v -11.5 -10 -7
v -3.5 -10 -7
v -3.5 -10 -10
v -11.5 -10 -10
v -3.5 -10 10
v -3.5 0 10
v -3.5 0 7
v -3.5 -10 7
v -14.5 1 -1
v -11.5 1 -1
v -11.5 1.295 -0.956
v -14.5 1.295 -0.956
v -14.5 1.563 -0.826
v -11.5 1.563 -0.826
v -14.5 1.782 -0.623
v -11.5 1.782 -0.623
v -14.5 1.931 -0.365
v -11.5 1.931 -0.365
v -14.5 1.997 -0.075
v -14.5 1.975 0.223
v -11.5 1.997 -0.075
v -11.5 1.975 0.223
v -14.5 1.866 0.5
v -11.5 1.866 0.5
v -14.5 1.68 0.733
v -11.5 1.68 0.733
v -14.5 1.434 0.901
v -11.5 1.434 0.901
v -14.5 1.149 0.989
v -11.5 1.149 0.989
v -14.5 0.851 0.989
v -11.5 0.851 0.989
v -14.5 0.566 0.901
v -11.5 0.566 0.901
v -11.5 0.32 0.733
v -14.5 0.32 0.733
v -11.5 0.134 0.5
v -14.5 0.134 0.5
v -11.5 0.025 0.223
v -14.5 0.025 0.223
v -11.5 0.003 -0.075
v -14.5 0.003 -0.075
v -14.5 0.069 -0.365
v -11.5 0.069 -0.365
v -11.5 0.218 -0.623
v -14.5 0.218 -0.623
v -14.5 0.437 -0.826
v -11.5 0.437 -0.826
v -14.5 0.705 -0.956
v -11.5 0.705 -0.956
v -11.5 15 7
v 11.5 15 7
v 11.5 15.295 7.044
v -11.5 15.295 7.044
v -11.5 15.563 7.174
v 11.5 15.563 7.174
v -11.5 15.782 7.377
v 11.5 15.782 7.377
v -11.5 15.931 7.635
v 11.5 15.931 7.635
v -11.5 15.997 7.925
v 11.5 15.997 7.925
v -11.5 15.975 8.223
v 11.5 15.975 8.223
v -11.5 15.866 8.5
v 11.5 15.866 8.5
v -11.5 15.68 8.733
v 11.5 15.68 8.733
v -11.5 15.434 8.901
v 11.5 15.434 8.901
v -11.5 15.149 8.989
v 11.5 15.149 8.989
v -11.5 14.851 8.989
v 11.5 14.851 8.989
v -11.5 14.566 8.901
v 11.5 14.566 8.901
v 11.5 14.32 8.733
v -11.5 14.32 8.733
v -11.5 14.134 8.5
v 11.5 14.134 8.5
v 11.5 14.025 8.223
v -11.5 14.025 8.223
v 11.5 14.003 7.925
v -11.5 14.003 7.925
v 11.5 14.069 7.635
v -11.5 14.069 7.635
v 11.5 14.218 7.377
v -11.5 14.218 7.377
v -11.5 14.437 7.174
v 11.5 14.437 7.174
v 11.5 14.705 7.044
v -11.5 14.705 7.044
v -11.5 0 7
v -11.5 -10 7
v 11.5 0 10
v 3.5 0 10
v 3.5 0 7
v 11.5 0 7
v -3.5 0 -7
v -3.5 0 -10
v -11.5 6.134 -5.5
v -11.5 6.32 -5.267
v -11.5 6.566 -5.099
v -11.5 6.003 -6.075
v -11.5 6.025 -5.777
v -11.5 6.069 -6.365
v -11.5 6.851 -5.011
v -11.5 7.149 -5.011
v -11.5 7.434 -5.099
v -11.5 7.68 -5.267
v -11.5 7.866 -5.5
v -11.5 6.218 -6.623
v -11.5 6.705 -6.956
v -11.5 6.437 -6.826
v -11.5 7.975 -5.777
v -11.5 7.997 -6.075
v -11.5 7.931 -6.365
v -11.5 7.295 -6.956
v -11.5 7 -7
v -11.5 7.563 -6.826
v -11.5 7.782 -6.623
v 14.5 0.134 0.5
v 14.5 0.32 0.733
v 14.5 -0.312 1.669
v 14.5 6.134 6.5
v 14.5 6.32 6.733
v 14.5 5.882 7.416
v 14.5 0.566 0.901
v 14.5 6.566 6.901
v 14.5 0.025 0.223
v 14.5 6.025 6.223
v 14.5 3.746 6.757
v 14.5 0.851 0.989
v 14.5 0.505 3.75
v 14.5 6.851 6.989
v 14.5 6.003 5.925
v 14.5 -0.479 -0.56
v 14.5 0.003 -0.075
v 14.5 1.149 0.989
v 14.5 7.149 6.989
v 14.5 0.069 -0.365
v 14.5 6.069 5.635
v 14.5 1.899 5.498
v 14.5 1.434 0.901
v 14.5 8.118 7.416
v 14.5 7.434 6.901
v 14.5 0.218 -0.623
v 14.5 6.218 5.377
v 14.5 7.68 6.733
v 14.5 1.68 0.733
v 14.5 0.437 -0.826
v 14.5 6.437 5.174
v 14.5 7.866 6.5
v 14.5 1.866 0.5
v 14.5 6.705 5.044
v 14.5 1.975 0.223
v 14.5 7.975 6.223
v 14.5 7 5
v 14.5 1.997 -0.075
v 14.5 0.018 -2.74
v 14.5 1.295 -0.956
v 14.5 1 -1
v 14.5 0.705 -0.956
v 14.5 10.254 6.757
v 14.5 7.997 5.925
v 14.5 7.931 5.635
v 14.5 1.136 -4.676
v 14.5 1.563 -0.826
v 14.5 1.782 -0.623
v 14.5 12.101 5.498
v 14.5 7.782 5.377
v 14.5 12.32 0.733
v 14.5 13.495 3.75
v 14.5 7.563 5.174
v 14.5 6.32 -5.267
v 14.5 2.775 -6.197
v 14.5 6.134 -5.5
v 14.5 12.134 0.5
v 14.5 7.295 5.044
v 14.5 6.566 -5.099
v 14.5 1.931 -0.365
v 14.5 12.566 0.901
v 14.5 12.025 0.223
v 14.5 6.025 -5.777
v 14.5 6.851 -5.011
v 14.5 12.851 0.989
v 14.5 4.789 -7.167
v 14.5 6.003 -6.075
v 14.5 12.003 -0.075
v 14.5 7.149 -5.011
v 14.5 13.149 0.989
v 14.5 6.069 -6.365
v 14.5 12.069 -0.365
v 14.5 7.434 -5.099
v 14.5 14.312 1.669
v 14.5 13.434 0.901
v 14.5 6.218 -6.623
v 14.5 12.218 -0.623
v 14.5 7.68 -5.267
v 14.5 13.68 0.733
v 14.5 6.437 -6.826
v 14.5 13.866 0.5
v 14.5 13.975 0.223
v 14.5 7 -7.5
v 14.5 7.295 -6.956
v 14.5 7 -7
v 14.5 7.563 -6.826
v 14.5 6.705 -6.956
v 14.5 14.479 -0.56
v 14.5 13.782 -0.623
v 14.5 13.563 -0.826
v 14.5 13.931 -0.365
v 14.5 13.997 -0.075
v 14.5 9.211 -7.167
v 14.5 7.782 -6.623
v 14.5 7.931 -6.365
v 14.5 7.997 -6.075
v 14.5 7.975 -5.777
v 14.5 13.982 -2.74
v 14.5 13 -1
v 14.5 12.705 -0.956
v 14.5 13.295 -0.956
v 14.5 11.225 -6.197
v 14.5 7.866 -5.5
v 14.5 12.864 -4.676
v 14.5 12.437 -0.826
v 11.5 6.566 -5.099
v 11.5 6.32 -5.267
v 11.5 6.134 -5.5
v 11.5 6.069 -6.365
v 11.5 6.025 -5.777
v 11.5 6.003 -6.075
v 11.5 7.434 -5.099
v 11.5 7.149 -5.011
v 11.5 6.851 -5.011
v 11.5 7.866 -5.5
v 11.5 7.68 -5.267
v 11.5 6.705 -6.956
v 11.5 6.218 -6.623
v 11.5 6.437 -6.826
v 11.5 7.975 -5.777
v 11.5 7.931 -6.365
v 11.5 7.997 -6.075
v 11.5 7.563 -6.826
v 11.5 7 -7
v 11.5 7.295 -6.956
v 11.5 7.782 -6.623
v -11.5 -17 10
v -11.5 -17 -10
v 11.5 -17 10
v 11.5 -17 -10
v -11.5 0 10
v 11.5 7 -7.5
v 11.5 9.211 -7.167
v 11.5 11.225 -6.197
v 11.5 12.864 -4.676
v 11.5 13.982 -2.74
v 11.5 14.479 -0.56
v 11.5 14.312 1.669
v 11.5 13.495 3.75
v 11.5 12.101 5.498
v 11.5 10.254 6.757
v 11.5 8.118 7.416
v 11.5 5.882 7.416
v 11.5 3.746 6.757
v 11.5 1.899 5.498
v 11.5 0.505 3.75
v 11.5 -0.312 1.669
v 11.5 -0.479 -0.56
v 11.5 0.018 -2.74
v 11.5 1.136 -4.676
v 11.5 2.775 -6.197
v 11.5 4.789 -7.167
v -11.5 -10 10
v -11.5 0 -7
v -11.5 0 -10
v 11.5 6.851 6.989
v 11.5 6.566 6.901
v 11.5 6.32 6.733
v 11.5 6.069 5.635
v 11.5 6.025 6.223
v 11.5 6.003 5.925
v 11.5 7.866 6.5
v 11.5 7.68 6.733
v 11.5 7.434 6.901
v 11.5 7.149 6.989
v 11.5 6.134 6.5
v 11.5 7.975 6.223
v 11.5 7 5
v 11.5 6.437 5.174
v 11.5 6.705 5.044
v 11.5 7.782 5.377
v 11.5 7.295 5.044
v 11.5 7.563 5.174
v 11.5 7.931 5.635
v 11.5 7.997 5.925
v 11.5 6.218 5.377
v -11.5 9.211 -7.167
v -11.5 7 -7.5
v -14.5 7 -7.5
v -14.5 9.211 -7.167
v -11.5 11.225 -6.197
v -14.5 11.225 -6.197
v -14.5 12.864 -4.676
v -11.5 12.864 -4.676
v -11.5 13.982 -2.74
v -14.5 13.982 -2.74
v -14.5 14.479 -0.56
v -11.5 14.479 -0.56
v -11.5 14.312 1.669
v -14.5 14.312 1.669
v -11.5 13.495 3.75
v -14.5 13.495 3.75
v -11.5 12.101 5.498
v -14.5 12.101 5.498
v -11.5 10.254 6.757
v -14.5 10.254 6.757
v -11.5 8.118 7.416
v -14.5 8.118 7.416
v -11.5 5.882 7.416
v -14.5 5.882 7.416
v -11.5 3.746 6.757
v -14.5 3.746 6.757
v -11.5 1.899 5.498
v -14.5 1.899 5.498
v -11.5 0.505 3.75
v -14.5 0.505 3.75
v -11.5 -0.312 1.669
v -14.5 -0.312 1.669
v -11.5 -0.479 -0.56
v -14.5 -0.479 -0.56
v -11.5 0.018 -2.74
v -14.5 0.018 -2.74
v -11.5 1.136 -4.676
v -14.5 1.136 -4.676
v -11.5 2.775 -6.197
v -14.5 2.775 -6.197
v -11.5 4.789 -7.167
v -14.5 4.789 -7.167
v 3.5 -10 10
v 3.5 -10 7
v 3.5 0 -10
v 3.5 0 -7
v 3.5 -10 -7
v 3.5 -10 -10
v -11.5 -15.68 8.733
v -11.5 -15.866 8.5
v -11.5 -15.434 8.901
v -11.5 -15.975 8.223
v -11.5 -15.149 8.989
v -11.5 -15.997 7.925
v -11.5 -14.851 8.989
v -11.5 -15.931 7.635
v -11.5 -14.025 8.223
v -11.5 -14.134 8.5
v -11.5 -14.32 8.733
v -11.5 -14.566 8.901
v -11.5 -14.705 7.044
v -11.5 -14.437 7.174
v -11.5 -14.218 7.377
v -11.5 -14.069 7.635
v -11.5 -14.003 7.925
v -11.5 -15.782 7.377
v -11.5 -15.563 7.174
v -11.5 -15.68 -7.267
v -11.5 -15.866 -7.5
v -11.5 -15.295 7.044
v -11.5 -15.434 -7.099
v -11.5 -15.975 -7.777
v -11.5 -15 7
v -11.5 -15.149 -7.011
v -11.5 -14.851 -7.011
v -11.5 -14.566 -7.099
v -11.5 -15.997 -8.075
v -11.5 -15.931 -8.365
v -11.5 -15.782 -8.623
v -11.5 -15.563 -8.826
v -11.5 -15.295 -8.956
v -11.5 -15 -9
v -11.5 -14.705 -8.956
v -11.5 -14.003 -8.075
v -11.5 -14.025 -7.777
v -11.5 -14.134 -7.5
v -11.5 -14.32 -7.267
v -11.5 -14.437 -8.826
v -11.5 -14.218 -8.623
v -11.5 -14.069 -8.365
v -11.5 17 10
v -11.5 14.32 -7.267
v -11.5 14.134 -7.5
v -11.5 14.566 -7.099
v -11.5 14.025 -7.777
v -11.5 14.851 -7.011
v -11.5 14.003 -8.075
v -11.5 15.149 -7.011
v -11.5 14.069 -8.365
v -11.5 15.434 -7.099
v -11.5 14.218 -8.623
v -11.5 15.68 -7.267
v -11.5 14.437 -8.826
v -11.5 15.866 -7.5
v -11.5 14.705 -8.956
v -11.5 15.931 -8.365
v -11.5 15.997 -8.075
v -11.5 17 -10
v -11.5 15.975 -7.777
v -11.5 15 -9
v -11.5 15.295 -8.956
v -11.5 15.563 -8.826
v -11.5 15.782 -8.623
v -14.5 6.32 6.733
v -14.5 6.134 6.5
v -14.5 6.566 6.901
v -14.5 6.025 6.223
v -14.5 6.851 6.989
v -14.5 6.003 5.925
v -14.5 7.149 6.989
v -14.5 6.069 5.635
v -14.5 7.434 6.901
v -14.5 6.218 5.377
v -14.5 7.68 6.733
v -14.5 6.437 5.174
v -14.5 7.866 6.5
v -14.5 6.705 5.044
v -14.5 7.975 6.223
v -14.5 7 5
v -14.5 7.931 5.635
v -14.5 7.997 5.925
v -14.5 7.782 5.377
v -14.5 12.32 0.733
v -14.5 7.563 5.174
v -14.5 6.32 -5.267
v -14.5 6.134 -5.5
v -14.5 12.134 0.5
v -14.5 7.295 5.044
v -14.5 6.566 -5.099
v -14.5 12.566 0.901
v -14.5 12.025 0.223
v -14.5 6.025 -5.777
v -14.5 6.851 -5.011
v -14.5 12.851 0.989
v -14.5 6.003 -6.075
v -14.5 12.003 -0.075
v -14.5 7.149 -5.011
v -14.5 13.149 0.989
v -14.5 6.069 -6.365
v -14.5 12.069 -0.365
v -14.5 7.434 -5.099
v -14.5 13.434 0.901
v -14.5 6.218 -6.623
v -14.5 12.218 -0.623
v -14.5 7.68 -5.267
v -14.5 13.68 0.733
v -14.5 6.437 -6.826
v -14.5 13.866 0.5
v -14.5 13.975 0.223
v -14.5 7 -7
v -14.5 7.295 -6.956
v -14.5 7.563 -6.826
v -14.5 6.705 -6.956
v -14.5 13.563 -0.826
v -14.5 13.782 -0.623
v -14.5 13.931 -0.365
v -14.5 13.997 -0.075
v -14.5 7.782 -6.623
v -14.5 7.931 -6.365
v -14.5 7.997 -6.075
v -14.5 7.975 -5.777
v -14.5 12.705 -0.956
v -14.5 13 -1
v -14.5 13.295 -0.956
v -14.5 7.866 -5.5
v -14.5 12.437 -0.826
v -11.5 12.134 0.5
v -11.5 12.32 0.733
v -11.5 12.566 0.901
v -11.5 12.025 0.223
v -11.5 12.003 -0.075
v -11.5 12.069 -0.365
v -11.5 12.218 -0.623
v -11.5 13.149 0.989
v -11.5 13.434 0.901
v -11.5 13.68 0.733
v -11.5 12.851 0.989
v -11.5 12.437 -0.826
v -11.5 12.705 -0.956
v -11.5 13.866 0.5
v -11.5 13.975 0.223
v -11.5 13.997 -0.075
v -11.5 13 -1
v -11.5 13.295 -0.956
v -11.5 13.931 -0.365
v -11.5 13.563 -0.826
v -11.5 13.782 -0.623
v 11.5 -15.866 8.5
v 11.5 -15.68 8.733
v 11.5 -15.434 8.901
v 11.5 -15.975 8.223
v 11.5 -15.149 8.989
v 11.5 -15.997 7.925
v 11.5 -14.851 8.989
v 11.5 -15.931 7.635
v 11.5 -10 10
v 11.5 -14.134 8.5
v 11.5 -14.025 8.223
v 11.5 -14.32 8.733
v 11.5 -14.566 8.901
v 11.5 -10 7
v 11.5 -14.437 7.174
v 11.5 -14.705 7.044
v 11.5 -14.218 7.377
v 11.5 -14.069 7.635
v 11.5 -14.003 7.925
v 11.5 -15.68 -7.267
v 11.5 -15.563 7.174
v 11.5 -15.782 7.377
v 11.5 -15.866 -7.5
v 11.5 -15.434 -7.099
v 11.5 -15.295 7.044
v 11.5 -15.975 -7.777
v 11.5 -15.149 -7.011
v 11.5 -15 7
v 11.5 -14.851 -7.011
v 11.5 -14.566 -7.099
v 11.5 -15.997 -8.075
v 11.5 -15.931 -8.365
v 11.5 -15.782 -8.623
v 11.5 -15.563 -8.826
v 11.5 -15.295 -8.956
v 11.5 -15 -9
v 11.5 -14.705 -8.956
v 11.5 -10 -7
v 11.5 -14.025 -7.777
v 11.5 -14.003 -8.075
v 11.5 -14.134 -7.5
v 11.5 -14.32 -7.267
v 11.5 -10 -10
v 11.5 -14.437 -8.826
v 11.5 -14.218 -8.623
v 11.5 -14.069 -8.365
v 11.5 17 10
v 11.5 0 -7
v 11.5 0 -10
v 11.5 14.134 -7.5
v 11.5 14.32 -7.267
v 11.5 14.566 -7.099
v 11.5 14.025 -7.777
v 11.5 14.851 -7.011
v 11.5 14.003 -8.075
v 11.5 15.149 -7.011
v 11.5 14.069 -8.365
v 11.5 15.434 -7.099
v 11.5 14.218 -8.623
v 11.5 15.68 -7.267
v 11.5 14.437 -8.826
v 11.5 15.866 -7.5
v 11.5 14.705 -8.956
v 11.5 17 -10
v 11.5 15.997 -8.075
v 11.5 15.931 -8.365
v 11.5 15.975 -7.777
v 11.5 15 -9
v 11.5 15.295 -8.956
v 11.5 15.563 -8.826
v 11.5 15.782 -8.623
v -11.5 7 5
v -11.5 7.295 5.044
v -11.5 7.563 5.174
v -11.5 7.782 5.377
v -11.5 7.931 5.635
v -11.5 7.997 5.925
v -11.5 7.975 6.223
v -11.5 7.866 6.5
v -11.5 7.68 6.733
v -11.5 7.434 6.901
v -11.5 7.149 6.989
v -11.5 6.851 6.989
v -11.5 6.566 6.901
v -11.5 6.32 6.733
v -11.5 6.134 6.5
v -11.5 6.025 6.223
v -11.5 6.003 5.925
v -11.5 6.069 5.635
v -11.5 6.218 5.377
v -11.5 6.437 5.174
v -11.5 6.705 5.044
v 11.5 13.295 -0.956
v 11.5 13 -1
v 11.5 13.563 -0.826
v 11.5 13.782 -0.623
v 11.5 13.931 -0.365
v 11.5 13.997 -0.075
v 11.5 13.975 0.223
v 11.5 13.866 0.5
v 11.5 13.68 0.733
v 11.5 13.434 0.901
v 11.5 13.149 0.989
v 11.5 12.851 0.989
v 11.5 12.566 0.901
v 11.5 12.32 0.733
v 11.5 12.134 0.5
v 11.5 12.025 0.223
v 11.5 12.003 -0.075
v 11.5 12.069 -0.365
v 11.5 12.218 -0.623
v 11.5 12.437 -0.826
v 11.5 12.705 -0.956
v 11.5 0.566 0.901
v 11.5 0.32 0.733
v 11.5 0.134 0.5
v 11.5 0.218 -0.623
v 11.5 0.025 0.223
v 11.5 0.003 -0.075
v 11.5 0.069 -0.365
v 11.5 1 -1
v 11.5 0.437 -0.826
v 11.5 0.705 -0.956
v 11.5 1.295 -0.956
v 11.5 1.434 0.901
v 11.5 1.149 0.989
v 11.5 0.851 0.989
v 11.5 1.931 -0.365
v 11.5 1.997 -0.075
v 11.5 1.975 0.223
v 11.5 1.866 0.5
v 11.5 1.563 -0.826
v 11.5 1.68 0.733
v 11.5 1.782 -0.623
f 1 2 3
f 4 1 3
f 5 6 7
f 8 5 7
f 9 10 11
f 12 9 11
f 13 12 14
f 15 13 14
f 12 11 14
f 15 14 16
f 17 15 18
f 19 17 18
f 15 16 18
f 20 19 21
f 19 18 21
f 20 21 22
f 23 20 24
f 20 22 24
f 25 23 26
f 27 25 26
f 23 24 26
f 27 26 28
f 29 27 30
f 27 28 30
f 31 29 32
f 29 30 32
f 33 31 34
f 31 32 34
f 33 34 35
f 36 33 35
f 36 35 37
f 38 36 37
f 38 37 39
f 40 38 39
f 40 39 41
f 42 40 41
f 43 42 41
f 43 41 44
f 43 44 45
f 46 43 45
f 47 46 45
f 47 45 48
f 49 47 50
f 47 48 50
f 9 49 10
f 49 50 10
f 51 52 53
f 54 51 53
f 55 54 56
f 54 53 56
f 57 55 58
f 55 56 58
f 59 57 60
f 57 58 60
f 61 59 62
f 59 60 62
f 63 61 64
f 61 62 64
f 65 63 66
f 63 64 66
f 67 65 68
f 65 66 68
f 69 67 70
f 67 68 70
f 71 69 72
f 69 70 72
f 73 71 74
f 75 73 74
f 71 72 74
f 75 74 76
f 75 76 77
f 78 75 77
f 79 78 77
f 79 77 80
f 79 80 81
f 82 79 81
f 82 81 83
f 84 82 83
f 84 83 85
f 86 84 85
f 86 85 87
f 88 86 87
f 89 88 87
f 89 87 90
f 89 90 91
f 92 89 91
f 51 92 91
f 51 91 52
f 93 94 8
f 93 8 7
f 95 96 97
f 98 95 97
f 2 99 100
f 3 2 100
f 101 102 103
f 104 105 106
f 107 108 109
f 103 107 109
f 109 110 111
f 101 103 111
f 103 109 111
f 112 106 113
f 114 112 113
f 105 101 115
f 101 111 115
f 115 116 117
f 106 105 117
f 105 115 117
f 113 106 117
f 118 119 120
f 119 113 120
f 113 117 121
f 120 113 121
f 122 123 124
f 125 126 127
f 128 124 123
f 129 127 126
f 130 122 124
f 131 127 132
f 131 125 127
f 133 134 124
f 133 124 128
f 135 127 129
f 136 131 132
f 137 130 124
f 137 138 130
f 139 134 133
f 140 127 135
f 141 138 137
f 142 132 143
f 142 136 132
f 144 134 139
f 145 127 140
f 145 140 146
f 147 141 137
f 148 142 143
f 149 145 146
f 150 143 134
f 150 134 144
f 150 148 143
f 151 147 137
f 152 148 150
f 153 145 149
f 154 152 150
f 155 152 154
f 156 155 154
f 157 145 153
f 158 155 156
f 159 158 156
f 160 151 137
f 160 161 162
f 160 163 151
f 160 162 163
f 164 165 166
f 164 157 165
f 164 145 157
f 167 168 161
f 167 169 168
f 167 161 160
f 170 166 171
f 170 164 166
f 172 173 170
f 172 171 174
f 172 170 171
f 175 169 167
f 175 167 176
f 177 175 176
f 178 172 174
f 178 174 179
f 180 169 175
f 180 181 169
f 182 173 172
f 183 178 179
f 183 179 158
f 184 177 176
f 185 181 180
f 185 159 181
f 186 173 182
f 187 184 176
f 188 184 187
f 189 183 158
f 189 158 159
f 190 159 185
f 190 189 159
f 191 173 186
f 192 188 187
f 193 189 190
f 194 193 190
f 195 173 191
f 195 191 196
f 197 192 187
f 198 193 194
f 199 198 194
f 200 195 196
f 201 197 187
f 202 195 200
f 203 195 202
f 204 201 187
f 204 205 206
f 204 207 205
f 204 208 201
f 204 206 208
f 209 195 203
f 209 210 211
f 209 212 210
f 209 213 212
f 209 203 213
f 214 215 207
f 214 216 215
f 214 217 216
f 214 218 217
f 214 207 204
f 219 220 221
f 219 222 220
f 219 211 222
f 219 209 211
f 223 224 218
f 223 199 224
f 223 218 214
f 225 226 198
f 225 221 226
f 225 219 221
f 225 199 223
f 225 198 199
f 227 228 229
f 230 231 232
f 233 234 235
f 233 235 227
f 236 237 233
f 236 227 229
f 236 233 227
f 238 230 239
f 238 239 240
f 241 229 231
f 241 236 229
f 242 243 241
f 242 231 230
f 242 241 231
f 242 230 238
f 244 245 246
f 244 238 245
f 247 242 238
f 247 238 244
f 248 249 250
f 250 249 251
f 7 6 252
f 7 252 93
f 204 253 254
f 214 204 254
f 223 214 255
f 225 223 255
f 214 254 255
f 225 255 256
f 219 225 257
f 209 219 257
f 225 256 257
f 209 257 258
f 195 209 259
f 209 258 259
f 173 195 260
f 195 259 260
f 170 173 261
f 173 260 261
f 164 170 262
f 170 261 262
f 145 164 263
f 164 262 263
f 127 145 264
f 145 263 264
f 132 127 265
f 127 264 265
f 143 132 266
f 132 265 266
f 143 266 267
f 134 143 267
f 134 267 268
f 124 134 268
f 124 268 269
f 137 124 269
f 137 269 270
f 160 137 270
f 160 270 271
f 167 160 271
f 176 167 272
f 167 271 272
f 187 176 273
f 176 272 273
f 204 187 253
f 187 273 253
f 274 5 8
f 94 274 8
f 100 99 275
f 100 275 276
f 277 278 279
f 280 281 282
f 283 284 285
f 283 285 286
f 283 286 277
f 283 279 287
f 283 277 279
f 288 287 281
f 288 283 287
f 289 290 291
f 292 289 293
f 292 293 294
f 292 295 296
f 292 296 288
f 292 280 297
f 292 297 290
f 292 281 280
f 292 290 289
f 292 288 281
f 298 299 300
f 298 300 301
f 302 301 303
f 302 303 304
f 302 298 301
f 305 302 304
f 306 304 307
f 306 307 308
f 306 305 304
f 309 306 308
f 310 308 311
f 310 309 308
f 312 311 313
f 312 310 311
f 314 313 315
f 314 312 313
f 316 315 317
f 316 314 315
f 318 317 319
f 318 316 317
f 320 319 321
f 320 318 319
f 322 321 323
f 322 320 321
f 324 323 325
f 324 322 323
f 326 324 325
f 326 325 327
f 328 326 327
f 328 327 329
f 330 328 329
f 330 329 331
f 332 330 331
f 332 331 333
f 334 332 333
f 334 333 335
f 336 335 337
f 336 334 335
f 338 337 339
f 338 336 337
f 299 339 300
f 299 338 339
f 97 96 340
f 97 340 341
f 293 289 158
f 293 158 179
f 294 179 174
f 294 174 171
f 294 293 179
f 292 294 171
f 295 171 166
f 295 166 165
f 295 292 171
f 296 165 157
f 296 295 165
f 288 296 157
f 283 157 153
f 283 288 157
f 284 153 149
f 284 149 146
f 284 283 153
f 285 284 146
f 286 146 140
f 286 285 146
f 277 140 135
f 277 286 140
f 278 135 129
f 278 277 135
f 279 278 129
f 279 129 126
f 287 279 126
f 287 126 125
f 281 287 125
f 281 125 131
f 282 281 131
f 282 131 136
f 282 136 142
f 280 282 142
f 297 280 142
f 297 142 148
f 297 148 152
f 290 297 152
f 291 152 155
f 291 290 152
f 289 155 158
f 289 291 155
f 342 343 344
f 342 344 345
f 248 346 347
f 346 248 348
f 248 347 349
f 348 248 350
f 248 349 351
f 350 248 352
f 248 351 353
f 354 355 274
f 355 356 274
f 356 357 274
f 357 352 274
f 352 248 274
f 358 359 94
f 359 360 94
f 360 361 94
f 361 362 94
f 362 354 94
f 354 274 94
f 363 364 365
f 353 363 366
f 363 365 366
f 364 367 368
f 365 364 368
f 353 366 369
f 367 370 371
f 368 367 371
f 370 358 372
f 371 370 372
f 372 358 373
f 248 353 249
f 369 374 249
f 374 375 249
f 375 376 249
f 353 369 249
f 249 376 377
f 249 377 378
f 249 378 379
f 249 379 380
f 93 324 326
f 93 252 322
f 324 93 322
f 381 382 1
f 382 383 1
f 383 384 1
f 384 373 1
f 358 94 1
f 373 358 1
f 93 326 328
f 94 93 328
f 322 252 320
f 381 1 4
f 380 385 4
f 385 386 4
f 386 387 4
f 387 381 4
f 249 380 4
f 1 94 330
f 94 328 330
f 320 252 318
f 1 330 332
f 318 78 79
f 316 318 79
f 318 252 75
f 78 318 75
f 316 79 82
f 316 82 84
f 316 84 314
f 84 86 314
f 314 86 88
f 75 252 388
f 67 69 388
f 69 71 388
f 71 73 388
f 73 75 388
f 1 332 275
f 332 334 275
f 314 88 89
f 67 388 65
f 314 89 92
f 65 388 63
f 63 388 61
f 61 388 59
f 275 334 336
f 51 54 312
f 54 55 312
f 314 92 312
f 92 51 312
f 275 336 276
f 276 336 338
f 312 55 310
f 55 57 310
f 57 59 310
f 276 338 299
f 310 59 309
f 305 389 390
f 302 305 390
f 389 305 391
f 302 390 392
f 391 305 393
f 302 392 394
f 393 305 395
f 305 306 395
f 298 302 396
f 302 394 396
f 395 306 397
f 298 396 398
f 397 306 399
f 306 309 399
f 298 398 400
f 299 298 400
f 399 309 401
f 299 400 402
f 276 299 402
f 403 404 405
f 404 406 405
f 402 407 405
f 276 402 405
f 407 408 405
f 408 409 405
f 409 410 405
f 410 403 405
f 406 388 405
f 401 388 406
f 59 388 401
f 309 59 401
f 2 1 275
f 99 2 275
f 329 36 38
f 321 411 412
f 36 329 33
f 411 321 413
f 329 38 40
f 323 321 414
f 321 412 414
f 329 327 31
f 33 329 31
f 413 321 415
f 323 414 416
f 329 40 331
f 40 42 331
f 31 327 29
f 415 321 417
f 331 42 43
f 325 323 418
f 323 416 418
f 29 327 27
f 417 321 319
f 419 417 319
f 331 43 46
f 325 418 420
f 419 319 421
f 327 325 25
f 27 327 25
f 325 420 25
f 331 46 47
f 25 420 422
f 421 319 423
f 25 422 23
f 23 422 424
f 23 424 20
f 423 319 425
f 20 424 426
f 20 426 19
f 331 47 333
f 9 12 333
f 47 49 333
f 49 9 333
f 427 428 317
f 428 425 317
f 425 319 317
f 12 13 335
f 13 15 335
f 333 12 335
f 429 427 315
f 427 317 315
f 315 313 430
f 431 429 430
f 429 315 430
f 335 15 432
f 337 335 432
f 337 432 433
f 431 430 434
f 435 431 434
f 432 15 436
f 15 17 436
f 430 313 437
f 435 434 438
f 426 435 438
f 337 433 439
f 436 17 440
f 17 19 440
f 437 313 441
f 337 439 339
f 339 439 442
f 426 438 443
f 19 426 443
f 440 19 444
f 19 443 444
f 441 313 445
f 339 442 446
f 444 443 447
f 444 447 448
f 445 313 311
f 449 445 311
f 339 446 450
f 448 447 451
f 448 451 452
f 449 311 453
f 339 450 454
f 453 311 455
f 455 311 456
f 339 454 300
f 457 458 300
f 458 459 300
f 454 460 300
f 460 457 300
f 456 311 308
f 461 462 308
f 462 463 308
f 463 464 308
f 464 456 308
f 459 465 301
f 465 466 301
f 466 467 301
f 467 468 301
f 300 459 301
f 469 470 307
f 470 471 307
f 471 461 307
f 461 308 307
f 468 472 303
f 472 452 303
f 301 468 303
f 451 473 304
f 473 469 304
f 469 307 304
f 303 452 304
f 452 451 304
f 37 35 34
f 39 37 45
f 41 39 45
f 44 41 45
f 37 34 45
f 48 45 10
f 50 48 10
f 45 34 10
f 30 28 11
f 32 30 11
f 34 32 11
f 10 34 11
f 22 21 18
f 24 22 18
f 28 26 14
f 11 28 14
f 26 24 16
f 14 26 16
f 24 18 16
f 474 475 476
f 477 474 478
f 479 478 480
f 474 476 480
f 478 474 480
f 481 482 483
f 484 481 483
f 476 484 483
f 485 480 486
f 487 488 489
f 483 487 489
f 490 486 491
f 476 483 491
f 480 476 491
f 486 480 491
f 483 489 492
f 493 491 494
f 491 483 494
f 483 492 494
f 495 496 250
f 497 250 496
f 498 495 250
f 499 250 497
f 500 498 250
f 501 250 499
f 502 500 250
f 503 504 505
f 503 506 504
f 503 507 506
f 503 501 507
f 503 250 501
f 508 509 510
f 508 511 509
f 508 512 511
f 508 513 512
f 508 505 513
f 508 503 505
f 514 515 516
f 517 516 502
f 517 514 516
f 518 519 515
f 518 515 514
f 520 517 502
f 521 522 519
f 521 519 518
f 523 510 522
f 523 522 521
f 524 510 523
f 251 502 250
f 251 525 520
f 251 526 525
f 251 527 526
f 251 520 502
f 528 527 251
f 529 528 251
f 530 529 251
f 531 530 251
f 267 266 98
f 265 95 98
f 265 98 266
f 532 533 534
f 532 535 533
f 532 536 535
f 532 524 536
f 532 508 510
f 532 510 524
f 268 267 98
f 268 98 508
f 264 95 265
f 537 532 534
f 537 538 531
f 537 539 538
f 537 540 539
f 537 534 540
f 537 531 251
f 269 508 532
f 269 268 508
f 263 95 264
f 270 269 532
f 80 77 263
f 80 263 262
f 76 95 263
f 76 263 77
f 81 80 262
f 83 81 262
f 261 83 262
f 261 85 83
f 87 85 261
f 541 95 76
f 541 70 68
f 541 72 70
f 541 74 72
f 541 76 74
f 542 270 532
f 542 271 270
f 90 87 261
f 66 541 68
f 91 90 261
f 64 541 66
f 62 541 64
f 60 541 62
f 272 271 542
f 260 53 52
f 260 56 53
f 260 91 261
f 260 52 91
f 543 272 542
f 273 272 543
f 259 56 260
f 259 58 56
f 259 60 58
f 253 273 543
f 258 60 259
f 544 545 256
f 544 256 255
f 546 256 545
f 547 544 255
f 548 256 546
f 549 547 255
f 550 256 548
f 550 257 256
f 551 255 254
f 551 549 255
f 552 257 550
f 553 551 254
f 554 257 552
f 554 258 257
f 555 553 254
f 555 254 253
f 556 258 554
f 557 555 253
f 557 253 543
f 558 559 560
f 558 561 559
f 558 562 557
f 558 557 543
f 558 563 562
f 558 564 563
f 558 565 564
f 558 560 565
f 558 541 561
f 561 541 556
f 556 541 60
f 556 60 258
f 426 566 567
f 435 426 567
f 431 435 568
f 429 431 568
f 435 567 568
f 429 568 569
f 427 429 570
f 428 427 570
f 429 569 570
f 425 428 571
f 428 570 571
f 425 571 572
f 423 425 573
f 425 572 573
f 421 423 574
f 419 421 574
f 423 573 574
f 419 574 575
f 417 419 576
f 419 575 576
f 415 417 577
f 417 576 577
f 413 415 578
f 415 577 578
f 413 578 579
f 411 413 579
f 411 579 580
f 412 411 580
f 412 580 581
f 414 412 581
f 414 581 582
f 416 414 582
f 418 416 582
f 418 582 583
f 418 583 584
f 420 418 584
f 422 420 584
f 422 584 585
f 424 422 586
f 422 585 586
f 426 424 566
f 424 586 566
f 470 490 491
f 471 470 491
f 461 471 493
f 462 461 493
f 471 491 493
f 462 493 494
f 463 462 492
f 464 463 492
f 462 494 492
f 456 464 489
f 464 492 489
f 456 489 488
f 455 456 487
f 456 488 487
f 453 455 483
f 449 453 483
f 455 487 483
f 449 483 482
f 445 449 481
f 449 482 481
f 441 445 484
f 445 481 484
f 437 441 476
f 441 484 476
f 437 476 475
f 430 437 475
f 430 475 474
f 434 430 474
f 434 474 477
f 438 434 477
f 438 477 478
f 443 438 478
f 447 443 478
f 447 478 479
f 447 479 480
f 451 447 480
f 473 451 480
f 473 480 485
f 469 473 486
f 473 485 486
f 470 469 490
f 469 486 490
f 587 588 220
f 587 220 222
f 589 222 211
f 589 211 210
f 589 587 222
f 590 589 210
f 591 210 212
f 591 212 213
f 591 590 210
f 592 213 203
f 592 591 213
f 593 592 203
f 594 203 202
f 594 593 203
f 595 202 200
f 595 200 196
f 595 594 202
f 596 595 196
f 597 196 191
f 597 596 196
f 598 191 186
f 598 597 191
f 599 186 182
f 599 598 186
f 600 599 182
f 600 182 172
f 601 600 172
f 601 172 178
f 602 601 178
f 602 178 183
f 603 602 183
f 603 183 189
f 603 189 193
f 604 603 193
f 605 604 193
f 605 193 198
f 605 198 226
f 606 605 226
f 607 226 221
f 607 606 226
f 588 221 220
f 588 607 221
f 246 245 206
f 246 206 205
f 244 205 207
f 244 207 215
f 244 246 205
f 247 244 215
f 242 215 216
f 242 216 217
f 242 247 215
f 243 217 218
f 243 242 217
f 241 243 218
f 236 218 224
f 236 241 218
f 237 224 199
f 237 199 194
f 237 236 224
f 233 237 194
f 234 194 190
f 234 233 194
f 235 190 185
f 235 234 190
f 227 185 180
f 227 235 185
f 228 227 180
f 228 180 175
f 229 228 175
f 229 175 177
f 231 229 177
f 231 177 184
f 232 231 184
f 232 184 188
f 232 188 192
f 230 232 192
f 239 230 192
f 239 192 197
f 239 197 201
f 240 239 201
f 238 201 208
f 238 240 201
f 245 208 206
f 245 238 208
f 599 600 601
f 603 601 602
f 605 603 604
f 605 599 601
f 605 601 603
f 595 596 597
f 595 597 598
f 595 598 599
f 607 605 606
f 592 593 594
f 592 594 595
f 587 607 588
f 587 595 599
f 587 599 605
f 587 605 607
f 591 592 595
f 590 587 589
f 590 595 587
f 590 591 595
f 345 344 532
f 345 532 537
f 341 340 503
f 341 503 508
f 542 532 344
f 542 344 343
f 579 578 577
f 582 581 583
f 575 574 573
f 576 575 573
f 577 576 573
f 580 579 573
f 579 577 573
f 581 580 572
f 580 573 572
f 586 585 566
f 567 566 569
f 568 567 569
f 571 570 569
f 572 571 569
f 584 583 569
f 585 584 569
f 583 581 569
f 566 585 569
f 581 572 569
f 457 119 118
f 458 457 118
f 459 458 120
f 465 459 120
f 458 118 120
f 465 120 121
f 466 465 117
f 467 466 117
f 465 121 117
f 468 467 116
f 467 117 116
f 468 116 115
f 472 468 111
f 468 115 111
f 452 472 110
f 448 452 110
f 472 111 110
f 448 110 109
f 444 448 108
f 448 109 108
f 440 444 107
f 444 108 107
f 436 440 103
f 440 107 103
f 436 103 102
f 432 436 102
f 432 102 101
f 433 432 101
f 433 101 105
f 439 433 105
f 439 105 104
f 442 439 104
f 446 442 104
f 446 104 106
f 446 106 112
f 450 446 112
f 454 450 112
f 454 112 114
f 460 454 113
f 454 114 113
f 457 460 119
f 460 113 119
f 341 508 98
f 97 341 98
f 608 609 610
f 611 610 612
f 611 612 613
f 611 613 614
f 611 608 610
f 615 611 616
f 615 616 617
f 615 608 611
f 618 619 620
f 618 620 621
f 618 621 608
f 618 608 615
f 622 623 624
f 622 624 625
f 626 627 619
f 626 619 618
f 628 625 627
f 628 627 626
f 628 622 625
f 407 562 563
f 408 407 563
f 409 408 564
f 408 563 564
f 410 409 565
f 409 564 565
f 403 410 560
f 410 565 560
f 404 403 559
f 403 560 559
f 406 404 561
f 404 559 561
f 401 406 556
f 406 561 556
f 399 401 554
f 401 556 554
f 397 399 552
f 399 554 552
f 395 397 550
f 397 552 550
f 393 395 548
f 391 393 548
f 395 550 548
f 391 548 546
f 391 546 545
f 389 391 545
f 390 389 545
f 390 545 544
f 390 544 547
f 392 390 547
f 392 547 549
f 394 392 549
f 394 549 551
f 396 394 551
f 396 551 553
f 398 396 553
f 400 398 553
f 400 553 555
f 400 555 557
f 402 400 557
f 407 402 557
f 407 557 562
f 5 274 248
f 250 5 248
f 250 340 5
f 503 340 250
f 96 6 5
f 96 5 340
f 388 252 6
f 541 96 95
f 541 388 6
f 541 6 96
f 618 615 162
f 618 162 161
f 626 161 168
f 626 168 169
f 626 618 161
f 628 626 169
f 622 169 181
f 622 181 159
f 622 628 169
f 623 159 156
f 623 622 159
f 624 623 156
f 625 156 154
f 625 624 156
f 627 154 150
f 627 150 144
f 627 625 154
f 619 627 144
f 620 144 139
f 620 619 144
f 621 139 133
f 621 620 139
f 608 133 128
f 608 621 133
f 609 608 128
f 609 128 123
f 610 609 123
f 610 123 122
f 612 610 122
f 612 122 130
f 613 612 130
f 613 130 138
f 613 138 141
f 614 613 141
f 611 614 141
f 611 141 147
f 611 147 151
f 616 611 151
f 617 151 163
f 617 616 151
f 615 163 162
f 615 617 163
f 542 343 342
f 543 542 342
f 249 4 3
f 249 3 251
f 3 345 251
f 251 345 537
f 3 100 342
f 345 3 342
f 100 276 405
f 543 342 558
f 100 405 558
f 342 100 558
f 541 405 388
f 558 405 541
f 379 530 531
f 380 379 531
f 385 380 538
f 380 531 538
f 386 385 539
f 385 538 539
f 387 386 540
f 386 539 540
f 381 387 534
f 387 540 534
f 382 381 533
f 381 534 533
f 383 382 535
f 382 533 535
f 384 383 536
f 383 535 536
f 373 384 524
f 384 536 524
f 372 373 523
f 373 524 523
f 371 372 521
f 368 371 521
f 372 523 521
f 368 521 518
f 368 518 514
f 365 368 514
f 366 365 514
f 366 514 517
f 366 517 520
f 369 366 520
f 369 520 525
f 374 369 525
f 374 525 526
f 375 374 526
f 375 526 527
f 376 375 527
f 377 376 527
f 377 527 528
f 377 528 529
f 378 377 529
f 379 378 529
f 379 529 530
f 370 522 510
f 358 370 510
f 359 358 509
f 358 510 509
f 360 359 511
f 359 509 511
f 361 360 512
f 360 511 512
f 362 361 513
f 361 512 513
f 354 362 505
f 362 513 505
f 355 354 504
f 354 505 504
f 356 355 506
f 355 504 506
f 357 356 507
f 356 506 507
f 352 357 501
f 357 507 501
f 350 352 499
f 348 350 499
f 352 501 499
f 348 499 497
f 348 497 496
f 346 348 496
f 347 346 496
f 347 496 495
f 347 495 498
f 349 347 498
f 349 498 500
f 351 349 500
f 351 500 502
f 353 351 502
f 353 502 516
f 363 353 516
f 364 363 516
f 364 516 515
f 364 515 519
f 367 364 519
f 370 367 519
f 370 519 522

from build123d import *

# Parameters (mm, degrees)
SKETCH1_W           = 23
SKETCH1_H           = 20
BOSS_EXTRUDE1_DEPTH = 17
SKETCH2_R           = 7.5
SKETCH2_R_2         = 1
BOSS_EXTRUDE2_DEPTH = 3
SKETCH3_W           = 3
SKETCH3_H           = 10
CUT_EXTRUDE1_DEPTH  = 8
SKETCH4_R           = 1
CUT_EXTRUDE2_DEPTH  = 33.634337744


with BuildPart() as part:
    # Sketch1 → Boss-Extrude1 (new, symmetric)
    with BuildSketch(Plane(origin=(0, 0, 0), x_dir=(1, 0, 0), z_dir=(0, 1, 0))):
        Rectangle(SKETCH1_W, SKETCH1_H)
    extrude(amount=BOSS_EXTRUDE1_DEPTH, both=True)

    # Sketch2 → Boss-Extrude2 (add)
    with BuildSketch(Plane(origin=(11.5, 0, 0), x_dir=(0, 0, -1), z_dir=(1, 0, 0))):
        with Locations((0, 7)):
            Circle(SKETCH2_R)
        with Locations((0, 13)):
            Circle(SKETCH2_R_2, mode=Mode.SUBTRACT)
        with Locations((6, 7)):
            Circle(SKETCH2_R_2, mode=Mode.SUBTRACT)
        with Locations((0, 1)):
            Circle(SKETCH2_R_2, mode=Mode.SUBTRACT)
        with Locations((-6, 7)):
            Circle(SKETCH2_R_2, mode=Mode.SUBTRACT)
    boss_extrude2 = extrude(amount=BOSS_EXTRUDE2_DEPTH)

    # Mirror1: Boss-Extrude2 across plane
    add(boss_extrude2.mirror(Plane(origin=(0, 0, 0), x_dir=(0, 0, 1), z_dir=(1, 0, 0))))

    # Sketch3 → Cut-Extrude1 (cut)
    with BuildSketch(Plane(origin=(11.5, 0, 0), x_dir=(0, 0, -1), z_dir=(1, 0, 0))):
        with Locations((-8.5, -5)):
            Rectangle(SKETCH3_W, SKETCH3_H)
        with Locations((8.5, -5)):
            Rectangle(SKETCH3_W, SKETCH3_H)
    cut_extrude1 = extrude(amount=-CUT_EXTRUDE1_DEPTH, mode=Mode.SUBTRACT)

    # Mirror2: Cut-Extrude1 across plane
    add(cut_extrude1.mirror(Plane(origin=(0, 0, 0), x_dir=(0, 0, 1), z_dir=(1, 0, 0))), mode=Mode.SUBTRACT)

    # Sketch4 → Cut-Extrude2 (cut, through all)
    with BuildSketch(Plane(origin=(11.5, 0, 0), x_dir=(0, 0, -1), z_dir=(1, 0, 0))):
        with Locations((-8, 15)):
            Circle(SKETCH4_R)
        with Locations((8, 15)):
            Circle(SKETCH4_R)
        with Locations((-8, -15)):
            Circle(SKETCH4_R)
        with Locations((8, -15)):
            Circle(SKETCH4_R)
    extrude(amount=-CUT_EXTRUDE2_DEPTH, mode=Mode.SUBTRACT)


solid = part.part
